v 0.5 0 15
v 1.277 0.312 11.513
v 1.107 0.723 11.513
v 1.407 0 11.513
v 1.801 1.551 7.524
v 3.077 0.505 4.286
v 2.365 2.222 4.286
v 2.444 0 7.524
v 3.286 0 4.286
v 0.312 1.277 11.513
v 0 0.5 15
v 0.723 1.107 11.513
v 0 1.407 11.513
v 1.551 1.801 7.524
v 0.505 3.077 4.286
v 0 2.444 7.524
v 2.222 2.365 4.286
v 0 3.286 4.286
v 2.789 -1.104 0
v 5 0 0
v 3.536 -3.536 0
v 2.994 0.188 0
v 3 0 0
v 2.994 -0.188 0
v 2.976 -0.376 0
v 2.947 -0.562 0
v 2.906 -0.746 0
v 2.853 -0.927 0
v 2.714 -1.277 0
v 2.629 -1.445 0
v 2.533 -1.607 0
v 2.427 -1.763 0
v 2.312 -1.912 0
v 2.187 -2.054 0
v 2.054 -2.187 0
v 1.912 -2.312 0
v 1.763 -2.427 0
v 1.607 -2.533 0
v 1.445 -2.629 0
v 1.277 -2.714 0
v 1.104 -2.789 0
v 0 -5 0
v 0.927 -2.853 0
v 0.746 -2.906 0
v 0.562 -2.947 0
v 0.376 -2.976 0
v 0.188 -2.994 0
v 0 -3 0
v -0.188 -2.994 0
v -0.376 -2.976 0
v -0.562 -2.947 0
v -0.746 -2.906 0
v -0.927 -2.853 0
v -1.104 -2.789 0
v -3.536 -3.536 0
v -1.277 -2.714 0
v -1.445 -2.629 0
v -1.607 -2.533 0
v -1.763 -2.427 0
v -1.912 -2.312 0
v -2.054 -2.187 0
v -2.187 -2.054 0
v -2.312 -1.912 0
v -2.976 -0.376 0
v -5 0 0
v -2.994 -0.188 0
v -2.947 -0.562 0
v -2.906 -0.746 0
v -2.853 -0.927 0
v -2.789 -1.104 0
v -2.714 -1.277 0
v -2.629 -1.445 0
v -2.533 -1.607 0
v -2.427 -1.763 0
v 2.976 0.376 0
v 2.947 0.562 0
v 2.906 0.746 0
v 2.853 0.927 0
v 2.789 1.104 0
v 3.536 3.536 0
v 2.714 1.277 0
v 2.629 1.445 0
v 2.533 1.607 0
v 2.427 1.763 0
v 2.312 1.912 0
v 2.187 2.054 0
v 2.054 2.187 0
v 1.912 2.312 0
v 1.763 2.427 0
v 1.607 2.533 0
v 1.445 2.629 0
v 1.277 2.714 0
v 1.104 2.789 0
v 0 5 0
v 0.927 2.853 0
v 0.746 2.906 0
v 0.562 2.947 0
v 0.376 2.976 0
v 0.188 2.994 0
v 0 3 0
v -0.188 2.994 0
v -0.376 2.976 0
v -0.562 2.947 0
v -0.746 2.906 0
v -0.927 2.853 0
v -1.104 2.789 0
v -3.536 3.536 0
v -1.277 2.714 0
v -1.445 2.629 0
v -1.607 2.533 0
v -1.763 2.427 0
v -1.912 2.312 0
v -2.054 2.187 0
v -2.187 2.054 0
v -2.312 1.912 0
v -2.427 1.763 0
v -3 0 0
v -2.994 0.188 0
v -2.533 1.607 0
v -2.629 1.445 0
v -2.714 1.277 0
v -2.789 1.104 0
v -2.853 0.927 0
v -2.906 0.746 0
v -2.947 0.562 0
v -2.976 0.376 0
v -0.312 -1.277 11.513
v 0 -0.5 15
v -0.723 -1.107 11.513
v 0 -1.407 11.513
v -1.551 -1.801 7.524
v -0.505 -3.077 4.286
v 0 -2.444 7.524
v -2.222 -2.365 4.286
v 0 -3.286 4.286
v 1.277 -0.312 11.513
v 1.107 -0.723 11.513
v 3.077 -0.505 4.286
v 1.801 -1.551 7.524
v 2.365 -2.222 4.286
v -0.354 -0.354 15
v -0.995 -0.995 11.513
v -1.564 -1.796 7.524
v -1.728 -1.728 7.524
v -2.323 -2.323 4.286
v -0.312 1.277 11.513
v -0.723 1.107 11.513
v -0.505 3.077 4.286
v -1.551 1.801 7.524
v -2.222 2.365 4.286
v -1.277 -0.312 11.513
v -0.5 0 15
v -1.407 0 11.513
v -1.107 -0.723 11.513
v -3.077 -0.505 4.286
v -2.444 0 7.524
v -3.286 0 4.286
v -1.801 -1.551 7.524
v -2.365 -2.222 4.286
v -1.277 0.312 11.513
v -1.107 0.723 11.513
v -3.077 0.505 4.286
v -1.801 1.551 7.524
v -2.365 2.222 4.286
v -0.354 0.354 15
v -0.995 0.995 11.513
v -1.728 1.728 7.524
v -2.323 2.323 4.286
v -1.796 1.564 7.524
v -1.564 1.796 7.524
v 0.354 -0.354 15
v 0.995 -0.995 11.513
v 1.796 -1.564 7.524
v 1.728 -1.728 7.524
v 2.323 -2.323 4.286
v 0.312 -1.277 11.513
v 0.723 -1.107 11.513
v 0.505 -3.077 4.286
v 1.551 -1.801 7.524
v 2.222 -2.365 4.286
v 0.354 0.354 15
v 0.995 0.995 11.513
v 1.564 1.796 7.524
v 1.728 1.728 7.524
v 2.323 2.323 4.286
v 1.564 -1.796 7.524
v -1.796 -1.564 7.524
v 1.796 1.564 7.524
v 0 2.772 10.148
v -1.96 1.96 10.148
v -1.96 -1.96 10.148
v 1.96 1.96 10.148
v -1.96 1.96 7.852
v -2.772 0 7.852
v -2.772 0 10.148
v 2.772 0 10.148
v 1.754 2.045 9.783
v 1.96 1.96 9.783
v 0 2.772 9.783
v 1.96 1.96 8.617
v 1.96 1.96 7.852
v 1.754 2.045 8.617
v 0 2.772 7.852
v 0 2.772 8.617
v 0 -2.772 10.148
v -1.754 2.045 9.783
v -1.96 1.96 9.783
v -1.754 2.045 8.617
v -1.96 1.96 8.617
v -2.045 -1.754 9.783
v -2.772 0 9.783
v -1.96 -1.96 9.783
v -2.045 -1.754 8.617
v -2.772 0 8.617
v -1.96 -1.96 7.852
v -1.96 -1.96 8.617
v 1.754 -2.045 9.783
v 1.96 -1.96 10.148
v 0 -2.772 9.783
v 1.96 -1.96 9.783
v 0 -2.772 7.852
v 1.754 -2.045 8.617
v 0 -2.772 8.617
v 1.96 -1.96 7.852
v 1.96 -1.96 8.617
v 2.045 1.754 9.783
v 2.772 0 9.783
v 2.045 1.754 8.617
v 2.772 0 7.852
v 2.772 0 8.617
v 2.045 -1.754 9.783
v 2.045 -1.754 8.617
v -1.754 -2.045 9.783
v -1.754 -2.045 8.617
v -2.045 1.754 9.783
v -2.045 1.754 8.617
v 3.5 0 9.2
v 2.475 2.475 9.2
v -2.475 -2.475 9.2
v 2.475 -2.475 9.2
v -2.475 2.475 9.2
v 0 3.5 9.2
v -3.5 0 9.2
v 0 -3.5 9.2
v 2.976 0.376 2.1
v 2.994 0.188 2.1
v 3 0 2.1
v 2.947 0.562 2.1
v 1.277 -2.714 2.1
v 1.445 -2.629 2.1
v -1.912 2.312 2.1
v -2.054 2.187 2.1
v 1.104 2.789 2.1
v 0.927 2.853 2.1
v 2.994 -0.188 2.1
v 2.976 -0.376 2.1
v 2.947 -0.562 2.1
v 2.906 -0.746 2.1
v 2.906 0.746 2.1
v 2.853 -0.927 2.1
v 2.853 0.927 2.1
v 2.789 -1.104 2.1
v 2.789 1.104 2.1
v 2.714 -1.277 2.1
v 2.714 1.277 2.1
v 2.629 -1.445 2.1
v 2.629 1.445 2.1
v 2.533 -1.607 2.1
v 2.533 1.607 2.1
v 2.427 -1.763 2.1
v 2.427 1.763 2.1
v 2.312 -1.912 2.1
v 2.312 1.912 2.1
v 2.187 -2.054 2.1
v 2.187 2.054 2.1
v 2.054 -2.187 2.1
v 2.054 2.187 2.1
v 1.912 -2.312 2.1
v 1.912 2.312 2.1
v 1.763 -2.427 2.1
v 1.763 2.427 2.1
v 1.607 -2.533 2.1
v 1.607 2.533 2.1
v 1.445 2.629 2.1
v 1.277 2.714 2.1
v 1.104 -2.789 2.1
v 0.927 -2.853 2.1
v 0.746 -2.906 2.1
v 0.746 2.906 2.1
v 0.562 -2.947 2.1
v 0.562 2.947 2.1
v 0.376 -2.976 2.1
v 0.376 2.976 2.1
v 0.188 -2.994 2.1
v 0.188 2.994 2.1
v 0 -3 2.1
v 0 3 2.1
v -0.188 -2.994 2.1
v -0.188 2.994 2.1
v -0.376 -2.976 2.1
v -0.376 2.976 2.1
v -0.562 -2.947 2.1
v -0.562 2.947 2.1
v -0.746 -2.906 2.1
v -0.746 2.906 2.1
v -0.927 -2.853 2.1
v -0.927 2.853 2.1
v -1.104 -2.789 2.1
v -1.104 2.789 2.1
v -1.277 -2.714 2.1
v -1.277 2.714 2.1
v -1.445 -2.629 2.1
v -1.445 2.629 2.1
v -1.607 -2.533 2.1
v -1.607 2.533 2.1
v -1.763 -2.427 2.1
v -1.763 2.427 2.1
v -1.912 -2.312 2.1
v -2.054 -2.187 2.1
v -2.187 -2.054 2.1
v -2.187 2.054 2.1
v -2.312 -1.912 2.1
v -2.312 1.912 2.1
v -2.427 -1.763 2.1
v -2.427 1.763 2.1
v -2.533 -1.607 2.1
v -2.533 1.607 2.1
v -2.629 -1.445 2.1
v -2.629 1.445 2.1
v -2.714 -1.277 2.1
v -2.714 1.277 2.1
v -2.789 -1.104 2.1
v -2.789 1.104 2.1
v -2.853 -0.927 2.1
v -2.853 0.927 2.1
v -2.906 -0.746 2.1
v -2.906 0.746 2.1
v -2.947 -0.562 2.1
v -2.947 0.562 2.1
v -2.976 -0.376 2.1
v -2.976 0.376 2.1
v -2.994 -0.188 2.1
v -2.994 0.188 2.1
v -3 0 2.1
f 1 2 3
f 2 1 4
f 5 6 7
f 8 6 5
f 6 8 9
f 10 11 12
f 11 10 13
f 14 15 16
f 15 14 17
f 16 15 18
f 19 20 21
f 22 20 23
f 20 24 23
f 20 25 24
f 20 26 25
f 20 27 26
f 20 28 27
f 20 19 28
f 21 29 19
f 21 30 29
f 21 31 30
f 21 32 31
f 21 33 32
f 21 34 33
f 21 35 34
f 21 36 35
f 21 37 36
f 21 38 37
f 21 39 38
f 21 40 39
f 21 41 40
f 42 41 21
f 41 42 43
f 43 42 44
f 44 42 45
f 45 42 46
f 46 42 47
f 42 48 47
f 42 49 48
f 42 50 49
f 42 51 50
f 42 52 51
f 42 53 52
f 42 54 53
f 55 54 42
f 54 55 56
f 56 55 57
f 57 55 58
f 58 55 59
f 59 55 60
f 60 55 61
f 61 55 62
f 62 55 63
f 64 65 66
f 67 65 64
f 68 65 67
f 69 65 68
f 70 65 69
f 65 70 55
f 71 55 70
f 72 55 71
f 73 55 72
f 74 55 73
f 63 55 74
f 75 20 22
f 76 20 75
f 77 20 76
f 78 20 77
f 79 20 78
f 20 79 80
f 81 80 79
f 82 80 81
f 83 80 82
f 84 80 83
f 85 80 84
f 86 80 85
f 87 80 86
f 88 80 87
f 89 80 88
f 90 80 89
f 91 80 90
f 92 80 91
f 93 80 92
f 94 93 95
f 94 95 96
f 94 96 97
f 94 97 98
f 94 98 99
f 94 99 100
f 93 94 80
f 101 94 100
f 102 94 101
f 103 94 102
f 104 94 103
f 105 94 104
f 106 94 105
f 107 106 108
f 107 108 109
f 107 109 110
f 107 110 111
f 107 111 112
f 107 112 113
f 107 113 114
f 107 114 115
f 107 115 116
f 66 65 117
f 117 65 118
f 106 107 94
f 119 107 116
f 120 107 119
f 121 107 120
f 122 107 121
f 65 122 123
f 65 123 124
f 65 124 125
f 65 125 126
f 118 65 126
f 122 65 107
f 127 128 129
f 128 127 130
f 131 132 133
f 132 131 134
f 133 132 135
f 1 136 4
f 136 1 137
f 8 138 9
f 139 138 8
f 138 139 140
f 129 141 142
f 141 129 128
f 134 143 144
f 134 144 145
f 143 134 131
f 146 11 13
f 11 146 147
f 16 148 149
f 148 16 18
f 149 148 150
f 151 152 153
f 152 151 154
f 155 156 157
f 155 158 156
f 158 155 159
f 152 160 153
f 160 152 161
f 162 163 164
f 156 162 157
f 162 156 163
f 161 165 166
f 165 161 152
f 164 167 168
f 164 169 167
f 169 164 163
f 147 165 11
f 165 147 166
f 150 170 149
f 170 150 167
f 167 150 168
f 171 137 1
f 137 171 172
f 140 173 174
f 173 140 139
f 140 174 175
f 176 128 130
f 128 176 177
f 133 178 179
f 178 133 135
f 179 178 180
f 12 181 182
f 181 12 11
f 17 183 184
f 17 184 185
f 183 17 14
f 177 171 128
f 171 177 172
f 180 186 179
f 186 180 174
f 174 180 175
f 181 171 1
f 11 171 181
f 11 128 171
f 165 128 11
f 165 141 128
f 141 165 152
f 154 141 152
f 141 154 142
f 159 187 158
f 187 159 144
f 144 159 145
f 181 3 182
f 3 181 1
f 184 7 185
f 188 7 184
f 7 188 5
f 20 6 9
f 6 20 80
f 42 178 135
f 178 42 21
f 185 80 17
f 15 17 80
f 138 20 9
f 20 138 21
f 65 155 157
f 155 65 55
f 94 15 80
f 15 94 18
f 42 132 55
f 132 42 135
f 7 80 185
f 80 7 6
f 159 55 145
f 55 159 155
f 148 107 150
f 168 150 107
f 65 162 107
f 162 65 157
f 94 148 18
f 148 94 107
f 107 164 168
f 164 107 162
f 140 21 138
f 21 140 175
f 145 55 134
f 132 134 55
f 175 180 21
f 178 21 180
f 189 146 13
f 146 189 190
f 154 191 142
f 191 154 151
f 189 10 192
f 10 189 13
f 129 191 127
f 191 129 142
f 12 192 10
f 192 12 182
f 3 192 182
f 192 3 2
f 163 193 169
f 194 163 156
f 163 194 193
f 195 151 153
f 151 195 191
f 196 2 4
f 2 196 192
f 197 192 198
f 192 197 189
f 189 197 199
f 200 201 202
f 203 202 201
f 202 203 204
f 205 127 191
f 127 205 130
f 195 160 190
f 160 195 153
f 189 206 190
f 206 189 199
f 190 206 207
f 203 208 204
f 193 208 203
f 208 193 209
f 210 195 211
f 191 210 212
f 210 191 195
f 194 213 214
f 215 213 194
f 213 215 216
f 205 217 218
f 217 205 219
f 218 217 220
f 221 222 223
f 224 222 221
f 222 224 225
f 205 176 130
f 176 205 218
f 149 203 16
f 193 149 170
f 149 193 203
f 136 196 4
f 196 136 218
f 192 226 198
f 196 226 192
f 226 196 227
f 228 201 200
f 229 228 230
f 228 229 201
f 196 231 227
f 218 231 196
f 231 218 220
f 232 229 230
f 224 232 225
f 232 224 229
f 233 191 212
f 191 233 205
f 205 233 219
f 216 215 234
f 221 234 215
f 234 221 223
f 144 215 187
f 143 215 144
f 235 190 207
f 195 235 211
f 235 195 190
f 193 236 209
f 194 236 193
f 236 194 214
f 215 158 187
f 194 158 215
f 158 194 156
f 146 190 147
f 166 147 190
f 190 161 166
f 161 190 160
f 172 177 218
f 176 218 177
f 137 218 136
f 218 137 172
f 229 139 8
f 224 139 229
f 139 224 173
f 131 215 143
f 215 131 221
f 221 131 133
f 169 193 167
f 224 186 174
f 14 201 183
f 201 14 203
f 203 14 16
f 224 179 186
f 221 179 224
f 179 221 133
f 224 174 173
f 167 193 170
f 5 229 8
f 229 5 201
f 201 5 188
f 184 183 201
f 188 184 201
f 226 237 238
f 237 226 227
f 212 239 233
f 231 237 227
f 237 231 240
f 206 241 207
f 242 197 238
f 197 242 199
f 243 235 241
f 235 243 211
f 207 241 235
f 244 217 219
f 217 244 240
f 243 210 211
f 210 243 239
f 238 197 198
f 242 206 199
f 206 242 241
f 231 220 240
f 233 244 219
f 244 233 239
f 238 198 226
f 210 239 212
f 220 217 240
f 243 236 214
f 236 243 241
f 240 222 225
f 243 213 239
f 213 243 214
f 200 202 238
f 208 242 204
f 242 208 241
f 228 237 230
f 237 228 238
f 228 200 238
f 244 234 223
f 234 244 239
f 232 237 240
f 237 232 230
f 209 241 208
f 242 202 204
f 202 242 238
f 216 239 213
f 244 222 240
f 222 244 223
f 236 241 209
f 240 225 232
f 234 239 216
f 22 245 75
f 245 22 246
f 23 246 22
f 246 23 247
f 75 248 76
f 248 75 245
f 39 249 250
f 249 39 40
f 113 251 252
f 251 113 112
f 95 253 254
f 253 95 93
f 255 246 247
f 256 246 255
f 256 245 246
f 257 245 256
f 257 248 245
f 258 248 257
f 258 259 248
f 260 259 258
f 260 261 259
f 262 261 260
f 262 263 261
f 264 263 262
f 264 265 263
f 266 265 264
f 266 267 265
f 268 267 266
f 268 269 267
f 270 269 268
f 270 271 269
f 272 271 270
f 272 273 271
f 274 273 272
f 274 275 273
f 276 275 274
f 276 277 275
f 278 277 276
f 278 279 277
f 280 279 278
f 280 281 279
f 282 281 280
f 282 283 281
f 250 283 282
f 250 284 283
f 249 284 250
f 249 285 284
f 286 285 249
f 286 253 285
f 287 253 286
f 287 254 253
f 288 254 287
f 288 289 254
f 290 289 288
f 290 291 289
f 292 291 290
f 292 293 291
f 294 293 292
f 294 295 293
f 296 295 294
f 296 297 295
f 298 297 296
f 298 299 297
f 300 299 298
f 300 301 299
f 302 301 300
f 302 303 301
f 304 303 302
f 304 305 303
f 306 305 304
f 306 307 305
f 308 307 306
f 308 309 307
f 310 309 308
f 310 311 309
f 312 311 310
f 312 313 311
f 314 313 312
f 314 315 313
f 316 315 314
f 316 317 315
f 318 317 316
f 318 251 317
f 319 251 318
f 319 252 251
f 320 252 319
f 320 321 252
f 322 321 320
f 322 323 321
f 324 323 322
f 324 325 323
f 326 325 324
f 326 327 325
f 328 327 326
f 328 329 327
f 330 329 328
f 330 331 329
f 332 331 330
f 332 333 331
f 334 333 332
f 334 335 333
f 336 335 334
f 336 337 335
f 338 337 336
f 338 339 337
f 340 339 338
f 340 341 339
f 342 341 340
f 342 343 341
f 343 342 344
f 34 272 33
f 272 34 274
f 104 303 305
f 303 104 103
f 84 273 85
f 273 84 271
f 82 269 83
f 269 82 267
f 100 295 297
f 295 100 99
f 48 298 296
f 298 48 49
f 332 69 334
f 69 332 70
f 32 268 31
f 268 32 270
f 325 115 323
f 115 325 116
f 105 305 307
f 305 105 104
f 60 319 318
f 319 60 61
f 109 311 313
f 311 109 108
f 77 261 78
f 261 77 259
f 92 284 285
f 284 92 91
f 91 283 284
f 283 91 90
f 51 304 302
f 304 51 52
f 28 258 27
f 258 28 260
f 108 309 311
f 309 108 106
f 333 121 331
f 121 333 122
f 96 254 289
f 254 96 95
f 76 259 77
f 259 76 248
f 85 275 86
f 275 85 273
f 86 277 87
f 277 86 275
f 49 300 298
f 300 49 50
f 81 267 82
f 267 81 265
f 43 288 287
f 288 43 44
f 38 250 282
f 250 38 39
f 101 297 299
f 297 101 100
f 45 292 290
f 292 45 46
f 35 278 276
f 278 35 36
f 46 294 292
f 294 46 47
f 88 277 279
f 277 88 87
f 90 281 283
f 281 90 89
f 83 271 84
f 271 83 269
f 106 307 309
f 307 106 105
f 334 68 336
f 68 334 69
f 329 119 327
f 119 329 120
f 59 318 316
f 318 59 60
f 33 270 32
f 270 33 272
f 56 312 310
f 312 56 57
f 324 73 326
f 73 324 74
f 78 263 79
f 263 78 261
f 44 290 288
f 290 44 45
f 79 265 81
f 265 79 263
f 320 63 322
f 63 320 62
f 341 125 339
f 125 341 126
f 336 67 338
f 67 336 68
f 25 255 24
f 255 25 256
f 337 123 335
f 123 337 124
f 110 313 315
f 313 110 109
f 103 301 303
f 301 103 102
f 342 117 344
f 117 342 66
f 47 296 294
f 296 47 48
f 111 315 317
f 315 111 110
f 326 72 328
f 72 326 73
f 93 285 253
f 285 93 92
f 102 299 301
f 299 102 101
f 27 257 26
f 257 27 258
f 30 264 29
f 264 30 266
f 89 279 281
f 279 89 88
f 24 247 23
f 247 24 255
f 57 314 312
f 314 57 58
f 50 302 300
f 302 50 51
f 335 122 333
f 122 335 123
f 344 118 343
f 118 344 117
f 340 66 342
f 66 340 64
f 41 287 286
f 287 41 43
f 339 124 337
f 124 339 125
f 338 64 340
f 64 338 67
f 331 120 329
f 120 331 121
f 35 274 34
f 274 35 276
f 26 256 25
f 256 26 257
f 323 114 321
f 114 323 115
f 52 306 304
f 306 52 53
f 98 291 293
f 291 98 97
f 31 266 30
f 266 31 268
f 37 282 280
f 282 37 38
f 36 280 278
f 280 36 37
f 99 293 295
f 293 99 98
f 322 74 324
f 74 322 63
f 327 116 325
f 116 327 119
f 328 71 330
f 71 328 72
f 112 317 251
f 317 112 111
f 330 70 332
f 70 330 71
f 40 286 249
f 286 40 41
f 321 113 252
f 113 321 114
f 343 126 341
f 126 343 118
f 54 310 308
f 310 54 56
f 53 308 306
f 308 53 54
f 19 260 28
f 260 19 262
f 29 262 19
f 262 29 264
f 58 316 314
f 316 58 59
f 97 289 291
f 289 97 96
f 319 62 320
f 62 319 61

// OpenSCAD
/*
Bishop Piece Generator (Střelec)
*/

// Parameters
$fn = 8; // Polygon detail (render smoothness)

magnet_height = 2.1;        // Magnet height (mm)
magnet_radius = 3;          // Magnet radius (mm)

body_height = 15;           // Total body height
body_radius = 4.5;          // Base radius

neck_radius = 3;            // Neck transition sphere radius
head_radius = 4;            // Head/helmet sphere radius

transparency = 5;           // Material transparency (for preview)
color_rgb = [143, 255, 61]; // RGB color (scaled to 0–1)

// Optional size boundary preview
module bounds() {
    color("red", 0.3)
        cube([6, 1, 17]); // Width × Depth × Height bounds
}

// Bishop piece
module bishop() {
    union() {
        color(color_rgb / 255, transparency) {

            // Body (slight taper)
            cylinder(h = body_height, r1 = body_radius - 0.1, r2 = body_radius - 4, center = false);

            // Tapered shoulder base
            cylinder(h = 5, r1 = body_radius + 0.5, r2 = body_radius - 1.5, center = false);

            // Neck sphere
            translate([0, 0, body_height - 6])
                sphere(r = neck_radius);

            // Helmet top (cone)
            translate([0, 0, body_height - 4.8])
                cylinder(h = 2, r1 = 3.5, r2 = 1, center = true);

            // Helmet bottom (inverted cone)
            translate([0, 0, body_height - 6.8])
                rotate([0, 180, 0])
                    cylinder(h = 2, r1 = 3.5, r2 = 1, center = true);
        }
    }
}

// Magnet cavity at base
module magnet_cavity() {
    offset = 0.5;
    translate([0, 0, -offset]) {
        color("yellow", transparency)
            cylinder(h = magnet_height + offset, r = magnet_radius, center = false, $fn = 100);
    }
}

// Final piece with magnet cutout
difference() {
    bishop();
    magnet_cavity();
}
